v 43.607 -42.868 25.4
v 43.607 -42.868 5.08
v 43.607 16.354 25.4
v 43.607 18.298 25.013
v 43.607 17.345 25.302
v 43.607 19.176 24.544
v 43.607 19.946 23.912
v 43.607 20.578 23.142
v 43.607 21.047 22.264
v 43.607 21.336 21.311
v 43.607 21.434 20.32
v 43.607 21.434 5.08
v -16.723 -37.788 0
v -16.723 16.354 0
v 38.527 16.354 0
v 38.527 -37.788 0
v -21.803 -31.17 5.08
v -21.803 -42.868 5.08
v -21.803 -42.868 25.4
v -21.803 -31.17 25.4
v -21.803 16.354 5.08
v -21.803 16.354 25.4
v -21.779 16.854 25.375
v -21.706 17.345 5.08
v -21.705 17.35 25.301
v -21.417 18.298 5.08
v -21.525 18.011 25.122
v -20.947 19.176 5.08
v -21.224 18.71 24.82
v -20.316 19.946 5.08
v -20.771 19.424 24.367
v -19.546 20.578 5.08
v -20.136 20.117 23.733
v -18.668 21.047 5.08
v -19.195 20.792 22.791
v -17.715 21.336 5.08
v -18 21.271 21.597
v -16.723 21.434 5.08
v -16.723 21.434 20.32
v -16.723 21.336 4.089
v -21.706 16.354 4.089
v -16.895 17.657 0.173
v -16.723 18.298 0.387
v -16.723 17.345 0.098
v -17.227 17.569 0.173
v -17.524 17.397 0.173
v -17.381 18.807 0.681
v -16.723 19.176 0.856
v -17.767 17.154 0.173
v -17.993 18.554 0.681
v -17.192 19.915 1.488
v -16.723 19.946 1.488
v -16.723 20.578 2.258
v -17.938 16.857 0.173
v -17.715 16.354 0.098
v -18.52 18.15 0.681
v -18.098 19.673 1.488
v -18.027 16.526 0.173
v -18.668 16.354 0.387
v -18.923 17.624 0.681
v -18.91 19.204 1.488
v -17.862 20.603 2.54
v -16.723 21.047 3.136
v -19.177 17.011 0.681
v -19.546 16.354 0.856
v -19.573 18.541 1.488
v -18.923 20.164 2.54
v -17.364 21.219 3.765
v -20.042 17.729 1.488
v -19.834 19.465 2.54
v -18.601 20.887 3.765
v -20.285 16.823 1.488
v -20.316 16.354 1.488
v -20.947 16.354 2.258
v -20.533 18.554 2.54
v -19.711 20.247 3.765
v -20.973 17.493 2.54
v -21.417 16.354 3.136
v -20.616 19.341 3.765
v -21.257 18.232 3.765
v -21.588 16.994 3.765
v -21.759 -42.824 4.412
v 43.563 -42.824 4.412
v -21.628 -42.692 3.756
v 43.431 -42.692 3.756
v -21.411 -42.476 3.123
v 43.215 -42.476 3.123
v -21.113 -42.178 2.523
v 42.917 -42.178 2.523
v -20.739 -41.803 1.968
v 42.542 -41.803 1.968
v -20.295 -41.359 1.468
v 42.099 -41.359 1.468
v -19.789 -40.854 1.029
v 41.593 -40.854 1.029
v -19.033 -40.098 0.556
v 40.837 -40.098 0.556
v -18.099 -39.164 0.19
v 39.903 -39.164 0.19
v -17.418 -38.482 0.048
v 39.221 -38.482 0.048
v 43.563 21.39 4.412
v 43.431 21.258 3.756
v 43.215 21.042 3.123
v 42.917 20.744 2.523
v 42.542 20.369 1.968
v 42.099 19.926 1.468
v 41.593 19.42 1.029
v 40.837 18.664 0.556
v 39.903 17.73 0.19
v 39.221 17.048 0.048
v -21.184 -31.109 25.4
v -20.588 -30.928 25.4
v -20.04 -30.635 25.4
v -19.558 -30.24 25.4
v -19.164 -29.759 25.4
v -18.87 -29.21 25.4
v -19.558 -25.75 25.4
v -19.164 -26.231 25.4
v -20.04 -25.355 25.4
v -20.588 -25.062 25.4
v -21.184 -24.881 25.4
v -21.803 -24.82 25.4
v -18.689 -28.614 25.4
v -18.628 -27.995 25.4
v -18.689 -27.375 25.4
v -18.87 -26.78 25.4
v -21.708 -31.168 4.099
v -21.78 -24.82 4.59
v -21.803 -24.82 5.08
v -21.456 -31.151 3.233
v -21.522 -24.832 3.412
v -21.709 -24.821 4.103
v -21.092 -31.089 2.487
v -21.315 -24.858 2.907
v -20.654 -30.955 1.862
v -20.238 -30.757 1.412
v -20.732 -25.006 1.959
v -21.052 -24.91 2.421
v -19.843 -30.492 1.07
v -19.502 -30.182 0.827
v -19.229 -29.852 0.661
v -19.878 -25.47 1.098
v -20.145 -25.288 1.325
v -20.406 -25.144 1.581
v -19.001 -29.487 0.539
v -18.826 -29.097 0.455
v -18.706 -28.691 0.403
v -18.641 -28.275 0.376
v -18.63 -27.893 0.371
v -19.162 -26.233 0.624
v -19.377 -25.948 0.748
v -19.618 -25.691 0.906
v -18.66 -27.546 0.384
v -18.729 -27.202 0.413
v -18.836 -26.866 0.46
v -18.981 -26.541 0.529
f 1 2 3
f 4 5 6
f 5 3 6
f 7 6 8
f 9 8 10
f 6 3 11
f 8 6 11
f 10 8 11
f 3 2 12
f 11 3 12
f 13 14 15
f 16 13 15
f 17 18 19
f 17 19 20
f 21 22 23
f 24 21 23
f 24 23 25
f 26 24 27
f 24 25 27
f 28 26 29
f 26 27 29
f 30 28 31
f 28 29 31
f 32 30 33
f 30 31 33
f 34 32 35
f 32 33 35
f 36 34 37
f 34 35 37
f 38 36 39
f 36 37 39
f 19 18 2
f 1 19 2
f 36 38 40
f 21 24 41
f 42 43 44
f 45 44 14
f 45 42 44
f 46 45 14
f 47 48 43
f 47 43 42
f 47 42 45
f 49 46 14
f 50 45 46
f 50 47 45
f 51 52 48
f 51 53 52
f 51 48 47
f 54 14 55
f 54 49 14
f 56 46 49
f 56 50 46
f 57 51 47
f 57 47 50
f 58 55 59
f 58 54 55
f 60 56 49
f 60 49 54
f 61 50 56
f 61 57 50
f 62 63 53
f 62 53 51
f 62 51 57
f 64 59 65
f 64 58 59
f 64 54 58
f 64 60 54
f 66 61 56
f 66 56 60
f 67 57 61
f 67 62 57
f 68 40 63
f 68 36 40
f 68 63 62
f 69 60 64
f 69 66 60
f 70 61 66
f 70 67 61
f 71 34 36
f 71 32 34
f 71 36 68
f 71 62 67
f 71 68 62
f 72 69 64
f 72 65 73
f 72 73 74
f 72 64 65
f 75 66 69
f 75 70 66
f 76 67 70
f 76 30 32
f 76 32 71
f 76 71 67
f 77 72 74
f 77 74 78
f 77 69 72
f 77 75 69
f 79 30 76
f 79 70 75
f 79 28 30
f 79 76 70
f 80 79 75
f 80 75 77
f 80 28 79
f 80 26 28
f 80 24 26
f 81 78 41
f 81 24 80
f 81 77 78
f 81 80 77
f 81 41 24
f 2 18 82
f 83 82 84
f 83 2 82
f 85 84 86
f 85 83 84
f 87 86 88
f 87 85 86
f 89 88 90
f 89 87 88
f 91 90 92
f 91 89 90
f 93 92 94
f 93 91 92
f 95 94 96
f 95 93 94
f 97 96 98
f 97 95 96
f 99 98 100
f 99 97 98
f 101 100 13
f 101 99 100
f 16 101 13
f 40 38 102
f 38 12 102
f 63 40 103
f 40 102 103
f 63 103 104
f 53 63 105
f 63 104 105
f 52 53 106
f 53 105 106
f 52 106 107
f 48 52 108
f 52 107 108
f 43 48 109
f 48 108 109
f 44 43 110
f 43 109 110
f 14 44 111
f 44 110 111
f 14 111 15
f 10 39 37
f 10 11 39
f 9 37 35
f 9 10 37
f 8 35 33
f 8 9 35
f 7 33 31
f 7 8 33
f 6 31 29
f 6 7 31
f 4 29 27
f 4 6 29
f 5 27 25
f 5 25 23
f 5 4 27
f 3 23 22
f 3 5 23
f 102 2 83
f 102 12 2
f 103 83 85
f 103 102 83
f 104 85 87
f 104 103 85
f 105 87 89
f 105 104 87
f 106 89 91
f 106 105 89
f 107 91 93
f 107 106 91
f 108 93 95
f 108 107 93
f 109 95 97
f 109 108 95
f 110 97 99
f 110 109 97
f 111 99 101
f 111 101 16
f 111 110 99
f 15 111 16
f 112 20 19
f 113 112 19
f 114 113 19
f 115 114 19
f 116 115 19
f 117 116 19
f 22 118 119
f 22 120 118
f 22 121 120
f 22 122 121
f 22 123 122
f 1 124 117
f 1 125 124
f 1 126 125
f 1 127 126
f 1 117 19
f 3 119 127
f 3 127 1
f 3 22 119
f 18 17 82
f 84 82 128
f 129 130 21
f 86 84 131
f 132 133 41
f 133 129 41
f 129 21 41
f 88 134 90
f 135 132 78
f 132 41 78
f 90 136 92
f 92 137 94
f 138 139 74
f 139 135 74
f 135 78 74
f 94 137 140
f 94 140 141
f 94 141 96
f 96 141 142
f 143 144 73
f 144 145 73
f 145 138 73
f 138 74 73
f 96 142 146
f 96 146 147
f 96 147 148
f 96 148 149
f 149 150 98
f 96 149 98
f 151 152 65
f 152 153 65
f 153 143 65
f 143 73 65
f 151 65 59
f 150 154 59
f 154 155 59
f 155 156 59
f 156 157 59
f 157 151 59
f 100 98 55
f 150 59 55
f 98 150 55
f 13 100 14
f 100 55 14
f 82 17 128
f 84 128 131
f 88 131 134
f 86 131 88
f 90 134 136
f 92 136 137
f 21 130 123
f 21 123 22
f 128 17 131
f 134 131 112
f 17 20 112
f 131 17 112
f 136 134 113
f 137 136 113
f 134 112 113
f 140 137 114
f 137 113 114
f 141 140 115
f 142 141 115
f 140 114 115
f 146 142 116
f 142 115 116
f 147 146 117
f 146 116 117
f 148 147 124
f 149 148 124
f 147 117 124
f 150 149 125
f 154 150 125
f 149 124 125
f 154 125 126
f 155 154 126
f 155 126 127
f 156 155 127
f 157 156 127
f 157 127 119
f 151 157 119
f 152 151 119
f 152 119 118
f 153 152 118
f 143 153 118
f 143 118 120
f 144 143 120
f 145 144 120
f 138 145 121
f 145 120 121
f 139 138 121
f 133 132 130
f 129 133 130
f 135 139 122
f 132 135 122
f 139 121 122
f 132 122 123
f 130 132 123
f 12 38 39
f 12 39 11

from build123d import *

# Parameters (mm, degrees)
F0_W     = 65.410413
F0_H     = 64.301759
F1_DEPTH = 25.4
F3_R     = 5.08
F4_D     = 6.35


with BuildPart() as f1:
    # F0 (on Top) → F1 (new body)
    with BuildSketch(Plane.XY):
        with Locations((10.90173, -10.716959)):
            Rectangle(F0_W, F0_H)
    extrude(amount=F1_DEPTH)

    # F3
    f3_edges = [f1.edges().sort_by_distance(p)[0] for p in [
        (10.901731, 21.43392, 25.4),
        (-21.803476, 21.43392, 12.7),
        (10.901731, 21.43392, 0),
        (-21.803476, -10.71696, 0),
        (10.901731, -42.867839, 0),
        (43.606937, -10.71696, 0),
    ]]
    fillet(f3_edges, radius=F3_R)

    # F4 (through all)
    with Locations(Plane(origin=(0, 0, 0), x_dir=(1, 0, 0), z_dir=(0, 0, -1))):
        with Locations((-21.803476, 27.994836)):
            Hole(F4_D / 2)


solid = f1.part
